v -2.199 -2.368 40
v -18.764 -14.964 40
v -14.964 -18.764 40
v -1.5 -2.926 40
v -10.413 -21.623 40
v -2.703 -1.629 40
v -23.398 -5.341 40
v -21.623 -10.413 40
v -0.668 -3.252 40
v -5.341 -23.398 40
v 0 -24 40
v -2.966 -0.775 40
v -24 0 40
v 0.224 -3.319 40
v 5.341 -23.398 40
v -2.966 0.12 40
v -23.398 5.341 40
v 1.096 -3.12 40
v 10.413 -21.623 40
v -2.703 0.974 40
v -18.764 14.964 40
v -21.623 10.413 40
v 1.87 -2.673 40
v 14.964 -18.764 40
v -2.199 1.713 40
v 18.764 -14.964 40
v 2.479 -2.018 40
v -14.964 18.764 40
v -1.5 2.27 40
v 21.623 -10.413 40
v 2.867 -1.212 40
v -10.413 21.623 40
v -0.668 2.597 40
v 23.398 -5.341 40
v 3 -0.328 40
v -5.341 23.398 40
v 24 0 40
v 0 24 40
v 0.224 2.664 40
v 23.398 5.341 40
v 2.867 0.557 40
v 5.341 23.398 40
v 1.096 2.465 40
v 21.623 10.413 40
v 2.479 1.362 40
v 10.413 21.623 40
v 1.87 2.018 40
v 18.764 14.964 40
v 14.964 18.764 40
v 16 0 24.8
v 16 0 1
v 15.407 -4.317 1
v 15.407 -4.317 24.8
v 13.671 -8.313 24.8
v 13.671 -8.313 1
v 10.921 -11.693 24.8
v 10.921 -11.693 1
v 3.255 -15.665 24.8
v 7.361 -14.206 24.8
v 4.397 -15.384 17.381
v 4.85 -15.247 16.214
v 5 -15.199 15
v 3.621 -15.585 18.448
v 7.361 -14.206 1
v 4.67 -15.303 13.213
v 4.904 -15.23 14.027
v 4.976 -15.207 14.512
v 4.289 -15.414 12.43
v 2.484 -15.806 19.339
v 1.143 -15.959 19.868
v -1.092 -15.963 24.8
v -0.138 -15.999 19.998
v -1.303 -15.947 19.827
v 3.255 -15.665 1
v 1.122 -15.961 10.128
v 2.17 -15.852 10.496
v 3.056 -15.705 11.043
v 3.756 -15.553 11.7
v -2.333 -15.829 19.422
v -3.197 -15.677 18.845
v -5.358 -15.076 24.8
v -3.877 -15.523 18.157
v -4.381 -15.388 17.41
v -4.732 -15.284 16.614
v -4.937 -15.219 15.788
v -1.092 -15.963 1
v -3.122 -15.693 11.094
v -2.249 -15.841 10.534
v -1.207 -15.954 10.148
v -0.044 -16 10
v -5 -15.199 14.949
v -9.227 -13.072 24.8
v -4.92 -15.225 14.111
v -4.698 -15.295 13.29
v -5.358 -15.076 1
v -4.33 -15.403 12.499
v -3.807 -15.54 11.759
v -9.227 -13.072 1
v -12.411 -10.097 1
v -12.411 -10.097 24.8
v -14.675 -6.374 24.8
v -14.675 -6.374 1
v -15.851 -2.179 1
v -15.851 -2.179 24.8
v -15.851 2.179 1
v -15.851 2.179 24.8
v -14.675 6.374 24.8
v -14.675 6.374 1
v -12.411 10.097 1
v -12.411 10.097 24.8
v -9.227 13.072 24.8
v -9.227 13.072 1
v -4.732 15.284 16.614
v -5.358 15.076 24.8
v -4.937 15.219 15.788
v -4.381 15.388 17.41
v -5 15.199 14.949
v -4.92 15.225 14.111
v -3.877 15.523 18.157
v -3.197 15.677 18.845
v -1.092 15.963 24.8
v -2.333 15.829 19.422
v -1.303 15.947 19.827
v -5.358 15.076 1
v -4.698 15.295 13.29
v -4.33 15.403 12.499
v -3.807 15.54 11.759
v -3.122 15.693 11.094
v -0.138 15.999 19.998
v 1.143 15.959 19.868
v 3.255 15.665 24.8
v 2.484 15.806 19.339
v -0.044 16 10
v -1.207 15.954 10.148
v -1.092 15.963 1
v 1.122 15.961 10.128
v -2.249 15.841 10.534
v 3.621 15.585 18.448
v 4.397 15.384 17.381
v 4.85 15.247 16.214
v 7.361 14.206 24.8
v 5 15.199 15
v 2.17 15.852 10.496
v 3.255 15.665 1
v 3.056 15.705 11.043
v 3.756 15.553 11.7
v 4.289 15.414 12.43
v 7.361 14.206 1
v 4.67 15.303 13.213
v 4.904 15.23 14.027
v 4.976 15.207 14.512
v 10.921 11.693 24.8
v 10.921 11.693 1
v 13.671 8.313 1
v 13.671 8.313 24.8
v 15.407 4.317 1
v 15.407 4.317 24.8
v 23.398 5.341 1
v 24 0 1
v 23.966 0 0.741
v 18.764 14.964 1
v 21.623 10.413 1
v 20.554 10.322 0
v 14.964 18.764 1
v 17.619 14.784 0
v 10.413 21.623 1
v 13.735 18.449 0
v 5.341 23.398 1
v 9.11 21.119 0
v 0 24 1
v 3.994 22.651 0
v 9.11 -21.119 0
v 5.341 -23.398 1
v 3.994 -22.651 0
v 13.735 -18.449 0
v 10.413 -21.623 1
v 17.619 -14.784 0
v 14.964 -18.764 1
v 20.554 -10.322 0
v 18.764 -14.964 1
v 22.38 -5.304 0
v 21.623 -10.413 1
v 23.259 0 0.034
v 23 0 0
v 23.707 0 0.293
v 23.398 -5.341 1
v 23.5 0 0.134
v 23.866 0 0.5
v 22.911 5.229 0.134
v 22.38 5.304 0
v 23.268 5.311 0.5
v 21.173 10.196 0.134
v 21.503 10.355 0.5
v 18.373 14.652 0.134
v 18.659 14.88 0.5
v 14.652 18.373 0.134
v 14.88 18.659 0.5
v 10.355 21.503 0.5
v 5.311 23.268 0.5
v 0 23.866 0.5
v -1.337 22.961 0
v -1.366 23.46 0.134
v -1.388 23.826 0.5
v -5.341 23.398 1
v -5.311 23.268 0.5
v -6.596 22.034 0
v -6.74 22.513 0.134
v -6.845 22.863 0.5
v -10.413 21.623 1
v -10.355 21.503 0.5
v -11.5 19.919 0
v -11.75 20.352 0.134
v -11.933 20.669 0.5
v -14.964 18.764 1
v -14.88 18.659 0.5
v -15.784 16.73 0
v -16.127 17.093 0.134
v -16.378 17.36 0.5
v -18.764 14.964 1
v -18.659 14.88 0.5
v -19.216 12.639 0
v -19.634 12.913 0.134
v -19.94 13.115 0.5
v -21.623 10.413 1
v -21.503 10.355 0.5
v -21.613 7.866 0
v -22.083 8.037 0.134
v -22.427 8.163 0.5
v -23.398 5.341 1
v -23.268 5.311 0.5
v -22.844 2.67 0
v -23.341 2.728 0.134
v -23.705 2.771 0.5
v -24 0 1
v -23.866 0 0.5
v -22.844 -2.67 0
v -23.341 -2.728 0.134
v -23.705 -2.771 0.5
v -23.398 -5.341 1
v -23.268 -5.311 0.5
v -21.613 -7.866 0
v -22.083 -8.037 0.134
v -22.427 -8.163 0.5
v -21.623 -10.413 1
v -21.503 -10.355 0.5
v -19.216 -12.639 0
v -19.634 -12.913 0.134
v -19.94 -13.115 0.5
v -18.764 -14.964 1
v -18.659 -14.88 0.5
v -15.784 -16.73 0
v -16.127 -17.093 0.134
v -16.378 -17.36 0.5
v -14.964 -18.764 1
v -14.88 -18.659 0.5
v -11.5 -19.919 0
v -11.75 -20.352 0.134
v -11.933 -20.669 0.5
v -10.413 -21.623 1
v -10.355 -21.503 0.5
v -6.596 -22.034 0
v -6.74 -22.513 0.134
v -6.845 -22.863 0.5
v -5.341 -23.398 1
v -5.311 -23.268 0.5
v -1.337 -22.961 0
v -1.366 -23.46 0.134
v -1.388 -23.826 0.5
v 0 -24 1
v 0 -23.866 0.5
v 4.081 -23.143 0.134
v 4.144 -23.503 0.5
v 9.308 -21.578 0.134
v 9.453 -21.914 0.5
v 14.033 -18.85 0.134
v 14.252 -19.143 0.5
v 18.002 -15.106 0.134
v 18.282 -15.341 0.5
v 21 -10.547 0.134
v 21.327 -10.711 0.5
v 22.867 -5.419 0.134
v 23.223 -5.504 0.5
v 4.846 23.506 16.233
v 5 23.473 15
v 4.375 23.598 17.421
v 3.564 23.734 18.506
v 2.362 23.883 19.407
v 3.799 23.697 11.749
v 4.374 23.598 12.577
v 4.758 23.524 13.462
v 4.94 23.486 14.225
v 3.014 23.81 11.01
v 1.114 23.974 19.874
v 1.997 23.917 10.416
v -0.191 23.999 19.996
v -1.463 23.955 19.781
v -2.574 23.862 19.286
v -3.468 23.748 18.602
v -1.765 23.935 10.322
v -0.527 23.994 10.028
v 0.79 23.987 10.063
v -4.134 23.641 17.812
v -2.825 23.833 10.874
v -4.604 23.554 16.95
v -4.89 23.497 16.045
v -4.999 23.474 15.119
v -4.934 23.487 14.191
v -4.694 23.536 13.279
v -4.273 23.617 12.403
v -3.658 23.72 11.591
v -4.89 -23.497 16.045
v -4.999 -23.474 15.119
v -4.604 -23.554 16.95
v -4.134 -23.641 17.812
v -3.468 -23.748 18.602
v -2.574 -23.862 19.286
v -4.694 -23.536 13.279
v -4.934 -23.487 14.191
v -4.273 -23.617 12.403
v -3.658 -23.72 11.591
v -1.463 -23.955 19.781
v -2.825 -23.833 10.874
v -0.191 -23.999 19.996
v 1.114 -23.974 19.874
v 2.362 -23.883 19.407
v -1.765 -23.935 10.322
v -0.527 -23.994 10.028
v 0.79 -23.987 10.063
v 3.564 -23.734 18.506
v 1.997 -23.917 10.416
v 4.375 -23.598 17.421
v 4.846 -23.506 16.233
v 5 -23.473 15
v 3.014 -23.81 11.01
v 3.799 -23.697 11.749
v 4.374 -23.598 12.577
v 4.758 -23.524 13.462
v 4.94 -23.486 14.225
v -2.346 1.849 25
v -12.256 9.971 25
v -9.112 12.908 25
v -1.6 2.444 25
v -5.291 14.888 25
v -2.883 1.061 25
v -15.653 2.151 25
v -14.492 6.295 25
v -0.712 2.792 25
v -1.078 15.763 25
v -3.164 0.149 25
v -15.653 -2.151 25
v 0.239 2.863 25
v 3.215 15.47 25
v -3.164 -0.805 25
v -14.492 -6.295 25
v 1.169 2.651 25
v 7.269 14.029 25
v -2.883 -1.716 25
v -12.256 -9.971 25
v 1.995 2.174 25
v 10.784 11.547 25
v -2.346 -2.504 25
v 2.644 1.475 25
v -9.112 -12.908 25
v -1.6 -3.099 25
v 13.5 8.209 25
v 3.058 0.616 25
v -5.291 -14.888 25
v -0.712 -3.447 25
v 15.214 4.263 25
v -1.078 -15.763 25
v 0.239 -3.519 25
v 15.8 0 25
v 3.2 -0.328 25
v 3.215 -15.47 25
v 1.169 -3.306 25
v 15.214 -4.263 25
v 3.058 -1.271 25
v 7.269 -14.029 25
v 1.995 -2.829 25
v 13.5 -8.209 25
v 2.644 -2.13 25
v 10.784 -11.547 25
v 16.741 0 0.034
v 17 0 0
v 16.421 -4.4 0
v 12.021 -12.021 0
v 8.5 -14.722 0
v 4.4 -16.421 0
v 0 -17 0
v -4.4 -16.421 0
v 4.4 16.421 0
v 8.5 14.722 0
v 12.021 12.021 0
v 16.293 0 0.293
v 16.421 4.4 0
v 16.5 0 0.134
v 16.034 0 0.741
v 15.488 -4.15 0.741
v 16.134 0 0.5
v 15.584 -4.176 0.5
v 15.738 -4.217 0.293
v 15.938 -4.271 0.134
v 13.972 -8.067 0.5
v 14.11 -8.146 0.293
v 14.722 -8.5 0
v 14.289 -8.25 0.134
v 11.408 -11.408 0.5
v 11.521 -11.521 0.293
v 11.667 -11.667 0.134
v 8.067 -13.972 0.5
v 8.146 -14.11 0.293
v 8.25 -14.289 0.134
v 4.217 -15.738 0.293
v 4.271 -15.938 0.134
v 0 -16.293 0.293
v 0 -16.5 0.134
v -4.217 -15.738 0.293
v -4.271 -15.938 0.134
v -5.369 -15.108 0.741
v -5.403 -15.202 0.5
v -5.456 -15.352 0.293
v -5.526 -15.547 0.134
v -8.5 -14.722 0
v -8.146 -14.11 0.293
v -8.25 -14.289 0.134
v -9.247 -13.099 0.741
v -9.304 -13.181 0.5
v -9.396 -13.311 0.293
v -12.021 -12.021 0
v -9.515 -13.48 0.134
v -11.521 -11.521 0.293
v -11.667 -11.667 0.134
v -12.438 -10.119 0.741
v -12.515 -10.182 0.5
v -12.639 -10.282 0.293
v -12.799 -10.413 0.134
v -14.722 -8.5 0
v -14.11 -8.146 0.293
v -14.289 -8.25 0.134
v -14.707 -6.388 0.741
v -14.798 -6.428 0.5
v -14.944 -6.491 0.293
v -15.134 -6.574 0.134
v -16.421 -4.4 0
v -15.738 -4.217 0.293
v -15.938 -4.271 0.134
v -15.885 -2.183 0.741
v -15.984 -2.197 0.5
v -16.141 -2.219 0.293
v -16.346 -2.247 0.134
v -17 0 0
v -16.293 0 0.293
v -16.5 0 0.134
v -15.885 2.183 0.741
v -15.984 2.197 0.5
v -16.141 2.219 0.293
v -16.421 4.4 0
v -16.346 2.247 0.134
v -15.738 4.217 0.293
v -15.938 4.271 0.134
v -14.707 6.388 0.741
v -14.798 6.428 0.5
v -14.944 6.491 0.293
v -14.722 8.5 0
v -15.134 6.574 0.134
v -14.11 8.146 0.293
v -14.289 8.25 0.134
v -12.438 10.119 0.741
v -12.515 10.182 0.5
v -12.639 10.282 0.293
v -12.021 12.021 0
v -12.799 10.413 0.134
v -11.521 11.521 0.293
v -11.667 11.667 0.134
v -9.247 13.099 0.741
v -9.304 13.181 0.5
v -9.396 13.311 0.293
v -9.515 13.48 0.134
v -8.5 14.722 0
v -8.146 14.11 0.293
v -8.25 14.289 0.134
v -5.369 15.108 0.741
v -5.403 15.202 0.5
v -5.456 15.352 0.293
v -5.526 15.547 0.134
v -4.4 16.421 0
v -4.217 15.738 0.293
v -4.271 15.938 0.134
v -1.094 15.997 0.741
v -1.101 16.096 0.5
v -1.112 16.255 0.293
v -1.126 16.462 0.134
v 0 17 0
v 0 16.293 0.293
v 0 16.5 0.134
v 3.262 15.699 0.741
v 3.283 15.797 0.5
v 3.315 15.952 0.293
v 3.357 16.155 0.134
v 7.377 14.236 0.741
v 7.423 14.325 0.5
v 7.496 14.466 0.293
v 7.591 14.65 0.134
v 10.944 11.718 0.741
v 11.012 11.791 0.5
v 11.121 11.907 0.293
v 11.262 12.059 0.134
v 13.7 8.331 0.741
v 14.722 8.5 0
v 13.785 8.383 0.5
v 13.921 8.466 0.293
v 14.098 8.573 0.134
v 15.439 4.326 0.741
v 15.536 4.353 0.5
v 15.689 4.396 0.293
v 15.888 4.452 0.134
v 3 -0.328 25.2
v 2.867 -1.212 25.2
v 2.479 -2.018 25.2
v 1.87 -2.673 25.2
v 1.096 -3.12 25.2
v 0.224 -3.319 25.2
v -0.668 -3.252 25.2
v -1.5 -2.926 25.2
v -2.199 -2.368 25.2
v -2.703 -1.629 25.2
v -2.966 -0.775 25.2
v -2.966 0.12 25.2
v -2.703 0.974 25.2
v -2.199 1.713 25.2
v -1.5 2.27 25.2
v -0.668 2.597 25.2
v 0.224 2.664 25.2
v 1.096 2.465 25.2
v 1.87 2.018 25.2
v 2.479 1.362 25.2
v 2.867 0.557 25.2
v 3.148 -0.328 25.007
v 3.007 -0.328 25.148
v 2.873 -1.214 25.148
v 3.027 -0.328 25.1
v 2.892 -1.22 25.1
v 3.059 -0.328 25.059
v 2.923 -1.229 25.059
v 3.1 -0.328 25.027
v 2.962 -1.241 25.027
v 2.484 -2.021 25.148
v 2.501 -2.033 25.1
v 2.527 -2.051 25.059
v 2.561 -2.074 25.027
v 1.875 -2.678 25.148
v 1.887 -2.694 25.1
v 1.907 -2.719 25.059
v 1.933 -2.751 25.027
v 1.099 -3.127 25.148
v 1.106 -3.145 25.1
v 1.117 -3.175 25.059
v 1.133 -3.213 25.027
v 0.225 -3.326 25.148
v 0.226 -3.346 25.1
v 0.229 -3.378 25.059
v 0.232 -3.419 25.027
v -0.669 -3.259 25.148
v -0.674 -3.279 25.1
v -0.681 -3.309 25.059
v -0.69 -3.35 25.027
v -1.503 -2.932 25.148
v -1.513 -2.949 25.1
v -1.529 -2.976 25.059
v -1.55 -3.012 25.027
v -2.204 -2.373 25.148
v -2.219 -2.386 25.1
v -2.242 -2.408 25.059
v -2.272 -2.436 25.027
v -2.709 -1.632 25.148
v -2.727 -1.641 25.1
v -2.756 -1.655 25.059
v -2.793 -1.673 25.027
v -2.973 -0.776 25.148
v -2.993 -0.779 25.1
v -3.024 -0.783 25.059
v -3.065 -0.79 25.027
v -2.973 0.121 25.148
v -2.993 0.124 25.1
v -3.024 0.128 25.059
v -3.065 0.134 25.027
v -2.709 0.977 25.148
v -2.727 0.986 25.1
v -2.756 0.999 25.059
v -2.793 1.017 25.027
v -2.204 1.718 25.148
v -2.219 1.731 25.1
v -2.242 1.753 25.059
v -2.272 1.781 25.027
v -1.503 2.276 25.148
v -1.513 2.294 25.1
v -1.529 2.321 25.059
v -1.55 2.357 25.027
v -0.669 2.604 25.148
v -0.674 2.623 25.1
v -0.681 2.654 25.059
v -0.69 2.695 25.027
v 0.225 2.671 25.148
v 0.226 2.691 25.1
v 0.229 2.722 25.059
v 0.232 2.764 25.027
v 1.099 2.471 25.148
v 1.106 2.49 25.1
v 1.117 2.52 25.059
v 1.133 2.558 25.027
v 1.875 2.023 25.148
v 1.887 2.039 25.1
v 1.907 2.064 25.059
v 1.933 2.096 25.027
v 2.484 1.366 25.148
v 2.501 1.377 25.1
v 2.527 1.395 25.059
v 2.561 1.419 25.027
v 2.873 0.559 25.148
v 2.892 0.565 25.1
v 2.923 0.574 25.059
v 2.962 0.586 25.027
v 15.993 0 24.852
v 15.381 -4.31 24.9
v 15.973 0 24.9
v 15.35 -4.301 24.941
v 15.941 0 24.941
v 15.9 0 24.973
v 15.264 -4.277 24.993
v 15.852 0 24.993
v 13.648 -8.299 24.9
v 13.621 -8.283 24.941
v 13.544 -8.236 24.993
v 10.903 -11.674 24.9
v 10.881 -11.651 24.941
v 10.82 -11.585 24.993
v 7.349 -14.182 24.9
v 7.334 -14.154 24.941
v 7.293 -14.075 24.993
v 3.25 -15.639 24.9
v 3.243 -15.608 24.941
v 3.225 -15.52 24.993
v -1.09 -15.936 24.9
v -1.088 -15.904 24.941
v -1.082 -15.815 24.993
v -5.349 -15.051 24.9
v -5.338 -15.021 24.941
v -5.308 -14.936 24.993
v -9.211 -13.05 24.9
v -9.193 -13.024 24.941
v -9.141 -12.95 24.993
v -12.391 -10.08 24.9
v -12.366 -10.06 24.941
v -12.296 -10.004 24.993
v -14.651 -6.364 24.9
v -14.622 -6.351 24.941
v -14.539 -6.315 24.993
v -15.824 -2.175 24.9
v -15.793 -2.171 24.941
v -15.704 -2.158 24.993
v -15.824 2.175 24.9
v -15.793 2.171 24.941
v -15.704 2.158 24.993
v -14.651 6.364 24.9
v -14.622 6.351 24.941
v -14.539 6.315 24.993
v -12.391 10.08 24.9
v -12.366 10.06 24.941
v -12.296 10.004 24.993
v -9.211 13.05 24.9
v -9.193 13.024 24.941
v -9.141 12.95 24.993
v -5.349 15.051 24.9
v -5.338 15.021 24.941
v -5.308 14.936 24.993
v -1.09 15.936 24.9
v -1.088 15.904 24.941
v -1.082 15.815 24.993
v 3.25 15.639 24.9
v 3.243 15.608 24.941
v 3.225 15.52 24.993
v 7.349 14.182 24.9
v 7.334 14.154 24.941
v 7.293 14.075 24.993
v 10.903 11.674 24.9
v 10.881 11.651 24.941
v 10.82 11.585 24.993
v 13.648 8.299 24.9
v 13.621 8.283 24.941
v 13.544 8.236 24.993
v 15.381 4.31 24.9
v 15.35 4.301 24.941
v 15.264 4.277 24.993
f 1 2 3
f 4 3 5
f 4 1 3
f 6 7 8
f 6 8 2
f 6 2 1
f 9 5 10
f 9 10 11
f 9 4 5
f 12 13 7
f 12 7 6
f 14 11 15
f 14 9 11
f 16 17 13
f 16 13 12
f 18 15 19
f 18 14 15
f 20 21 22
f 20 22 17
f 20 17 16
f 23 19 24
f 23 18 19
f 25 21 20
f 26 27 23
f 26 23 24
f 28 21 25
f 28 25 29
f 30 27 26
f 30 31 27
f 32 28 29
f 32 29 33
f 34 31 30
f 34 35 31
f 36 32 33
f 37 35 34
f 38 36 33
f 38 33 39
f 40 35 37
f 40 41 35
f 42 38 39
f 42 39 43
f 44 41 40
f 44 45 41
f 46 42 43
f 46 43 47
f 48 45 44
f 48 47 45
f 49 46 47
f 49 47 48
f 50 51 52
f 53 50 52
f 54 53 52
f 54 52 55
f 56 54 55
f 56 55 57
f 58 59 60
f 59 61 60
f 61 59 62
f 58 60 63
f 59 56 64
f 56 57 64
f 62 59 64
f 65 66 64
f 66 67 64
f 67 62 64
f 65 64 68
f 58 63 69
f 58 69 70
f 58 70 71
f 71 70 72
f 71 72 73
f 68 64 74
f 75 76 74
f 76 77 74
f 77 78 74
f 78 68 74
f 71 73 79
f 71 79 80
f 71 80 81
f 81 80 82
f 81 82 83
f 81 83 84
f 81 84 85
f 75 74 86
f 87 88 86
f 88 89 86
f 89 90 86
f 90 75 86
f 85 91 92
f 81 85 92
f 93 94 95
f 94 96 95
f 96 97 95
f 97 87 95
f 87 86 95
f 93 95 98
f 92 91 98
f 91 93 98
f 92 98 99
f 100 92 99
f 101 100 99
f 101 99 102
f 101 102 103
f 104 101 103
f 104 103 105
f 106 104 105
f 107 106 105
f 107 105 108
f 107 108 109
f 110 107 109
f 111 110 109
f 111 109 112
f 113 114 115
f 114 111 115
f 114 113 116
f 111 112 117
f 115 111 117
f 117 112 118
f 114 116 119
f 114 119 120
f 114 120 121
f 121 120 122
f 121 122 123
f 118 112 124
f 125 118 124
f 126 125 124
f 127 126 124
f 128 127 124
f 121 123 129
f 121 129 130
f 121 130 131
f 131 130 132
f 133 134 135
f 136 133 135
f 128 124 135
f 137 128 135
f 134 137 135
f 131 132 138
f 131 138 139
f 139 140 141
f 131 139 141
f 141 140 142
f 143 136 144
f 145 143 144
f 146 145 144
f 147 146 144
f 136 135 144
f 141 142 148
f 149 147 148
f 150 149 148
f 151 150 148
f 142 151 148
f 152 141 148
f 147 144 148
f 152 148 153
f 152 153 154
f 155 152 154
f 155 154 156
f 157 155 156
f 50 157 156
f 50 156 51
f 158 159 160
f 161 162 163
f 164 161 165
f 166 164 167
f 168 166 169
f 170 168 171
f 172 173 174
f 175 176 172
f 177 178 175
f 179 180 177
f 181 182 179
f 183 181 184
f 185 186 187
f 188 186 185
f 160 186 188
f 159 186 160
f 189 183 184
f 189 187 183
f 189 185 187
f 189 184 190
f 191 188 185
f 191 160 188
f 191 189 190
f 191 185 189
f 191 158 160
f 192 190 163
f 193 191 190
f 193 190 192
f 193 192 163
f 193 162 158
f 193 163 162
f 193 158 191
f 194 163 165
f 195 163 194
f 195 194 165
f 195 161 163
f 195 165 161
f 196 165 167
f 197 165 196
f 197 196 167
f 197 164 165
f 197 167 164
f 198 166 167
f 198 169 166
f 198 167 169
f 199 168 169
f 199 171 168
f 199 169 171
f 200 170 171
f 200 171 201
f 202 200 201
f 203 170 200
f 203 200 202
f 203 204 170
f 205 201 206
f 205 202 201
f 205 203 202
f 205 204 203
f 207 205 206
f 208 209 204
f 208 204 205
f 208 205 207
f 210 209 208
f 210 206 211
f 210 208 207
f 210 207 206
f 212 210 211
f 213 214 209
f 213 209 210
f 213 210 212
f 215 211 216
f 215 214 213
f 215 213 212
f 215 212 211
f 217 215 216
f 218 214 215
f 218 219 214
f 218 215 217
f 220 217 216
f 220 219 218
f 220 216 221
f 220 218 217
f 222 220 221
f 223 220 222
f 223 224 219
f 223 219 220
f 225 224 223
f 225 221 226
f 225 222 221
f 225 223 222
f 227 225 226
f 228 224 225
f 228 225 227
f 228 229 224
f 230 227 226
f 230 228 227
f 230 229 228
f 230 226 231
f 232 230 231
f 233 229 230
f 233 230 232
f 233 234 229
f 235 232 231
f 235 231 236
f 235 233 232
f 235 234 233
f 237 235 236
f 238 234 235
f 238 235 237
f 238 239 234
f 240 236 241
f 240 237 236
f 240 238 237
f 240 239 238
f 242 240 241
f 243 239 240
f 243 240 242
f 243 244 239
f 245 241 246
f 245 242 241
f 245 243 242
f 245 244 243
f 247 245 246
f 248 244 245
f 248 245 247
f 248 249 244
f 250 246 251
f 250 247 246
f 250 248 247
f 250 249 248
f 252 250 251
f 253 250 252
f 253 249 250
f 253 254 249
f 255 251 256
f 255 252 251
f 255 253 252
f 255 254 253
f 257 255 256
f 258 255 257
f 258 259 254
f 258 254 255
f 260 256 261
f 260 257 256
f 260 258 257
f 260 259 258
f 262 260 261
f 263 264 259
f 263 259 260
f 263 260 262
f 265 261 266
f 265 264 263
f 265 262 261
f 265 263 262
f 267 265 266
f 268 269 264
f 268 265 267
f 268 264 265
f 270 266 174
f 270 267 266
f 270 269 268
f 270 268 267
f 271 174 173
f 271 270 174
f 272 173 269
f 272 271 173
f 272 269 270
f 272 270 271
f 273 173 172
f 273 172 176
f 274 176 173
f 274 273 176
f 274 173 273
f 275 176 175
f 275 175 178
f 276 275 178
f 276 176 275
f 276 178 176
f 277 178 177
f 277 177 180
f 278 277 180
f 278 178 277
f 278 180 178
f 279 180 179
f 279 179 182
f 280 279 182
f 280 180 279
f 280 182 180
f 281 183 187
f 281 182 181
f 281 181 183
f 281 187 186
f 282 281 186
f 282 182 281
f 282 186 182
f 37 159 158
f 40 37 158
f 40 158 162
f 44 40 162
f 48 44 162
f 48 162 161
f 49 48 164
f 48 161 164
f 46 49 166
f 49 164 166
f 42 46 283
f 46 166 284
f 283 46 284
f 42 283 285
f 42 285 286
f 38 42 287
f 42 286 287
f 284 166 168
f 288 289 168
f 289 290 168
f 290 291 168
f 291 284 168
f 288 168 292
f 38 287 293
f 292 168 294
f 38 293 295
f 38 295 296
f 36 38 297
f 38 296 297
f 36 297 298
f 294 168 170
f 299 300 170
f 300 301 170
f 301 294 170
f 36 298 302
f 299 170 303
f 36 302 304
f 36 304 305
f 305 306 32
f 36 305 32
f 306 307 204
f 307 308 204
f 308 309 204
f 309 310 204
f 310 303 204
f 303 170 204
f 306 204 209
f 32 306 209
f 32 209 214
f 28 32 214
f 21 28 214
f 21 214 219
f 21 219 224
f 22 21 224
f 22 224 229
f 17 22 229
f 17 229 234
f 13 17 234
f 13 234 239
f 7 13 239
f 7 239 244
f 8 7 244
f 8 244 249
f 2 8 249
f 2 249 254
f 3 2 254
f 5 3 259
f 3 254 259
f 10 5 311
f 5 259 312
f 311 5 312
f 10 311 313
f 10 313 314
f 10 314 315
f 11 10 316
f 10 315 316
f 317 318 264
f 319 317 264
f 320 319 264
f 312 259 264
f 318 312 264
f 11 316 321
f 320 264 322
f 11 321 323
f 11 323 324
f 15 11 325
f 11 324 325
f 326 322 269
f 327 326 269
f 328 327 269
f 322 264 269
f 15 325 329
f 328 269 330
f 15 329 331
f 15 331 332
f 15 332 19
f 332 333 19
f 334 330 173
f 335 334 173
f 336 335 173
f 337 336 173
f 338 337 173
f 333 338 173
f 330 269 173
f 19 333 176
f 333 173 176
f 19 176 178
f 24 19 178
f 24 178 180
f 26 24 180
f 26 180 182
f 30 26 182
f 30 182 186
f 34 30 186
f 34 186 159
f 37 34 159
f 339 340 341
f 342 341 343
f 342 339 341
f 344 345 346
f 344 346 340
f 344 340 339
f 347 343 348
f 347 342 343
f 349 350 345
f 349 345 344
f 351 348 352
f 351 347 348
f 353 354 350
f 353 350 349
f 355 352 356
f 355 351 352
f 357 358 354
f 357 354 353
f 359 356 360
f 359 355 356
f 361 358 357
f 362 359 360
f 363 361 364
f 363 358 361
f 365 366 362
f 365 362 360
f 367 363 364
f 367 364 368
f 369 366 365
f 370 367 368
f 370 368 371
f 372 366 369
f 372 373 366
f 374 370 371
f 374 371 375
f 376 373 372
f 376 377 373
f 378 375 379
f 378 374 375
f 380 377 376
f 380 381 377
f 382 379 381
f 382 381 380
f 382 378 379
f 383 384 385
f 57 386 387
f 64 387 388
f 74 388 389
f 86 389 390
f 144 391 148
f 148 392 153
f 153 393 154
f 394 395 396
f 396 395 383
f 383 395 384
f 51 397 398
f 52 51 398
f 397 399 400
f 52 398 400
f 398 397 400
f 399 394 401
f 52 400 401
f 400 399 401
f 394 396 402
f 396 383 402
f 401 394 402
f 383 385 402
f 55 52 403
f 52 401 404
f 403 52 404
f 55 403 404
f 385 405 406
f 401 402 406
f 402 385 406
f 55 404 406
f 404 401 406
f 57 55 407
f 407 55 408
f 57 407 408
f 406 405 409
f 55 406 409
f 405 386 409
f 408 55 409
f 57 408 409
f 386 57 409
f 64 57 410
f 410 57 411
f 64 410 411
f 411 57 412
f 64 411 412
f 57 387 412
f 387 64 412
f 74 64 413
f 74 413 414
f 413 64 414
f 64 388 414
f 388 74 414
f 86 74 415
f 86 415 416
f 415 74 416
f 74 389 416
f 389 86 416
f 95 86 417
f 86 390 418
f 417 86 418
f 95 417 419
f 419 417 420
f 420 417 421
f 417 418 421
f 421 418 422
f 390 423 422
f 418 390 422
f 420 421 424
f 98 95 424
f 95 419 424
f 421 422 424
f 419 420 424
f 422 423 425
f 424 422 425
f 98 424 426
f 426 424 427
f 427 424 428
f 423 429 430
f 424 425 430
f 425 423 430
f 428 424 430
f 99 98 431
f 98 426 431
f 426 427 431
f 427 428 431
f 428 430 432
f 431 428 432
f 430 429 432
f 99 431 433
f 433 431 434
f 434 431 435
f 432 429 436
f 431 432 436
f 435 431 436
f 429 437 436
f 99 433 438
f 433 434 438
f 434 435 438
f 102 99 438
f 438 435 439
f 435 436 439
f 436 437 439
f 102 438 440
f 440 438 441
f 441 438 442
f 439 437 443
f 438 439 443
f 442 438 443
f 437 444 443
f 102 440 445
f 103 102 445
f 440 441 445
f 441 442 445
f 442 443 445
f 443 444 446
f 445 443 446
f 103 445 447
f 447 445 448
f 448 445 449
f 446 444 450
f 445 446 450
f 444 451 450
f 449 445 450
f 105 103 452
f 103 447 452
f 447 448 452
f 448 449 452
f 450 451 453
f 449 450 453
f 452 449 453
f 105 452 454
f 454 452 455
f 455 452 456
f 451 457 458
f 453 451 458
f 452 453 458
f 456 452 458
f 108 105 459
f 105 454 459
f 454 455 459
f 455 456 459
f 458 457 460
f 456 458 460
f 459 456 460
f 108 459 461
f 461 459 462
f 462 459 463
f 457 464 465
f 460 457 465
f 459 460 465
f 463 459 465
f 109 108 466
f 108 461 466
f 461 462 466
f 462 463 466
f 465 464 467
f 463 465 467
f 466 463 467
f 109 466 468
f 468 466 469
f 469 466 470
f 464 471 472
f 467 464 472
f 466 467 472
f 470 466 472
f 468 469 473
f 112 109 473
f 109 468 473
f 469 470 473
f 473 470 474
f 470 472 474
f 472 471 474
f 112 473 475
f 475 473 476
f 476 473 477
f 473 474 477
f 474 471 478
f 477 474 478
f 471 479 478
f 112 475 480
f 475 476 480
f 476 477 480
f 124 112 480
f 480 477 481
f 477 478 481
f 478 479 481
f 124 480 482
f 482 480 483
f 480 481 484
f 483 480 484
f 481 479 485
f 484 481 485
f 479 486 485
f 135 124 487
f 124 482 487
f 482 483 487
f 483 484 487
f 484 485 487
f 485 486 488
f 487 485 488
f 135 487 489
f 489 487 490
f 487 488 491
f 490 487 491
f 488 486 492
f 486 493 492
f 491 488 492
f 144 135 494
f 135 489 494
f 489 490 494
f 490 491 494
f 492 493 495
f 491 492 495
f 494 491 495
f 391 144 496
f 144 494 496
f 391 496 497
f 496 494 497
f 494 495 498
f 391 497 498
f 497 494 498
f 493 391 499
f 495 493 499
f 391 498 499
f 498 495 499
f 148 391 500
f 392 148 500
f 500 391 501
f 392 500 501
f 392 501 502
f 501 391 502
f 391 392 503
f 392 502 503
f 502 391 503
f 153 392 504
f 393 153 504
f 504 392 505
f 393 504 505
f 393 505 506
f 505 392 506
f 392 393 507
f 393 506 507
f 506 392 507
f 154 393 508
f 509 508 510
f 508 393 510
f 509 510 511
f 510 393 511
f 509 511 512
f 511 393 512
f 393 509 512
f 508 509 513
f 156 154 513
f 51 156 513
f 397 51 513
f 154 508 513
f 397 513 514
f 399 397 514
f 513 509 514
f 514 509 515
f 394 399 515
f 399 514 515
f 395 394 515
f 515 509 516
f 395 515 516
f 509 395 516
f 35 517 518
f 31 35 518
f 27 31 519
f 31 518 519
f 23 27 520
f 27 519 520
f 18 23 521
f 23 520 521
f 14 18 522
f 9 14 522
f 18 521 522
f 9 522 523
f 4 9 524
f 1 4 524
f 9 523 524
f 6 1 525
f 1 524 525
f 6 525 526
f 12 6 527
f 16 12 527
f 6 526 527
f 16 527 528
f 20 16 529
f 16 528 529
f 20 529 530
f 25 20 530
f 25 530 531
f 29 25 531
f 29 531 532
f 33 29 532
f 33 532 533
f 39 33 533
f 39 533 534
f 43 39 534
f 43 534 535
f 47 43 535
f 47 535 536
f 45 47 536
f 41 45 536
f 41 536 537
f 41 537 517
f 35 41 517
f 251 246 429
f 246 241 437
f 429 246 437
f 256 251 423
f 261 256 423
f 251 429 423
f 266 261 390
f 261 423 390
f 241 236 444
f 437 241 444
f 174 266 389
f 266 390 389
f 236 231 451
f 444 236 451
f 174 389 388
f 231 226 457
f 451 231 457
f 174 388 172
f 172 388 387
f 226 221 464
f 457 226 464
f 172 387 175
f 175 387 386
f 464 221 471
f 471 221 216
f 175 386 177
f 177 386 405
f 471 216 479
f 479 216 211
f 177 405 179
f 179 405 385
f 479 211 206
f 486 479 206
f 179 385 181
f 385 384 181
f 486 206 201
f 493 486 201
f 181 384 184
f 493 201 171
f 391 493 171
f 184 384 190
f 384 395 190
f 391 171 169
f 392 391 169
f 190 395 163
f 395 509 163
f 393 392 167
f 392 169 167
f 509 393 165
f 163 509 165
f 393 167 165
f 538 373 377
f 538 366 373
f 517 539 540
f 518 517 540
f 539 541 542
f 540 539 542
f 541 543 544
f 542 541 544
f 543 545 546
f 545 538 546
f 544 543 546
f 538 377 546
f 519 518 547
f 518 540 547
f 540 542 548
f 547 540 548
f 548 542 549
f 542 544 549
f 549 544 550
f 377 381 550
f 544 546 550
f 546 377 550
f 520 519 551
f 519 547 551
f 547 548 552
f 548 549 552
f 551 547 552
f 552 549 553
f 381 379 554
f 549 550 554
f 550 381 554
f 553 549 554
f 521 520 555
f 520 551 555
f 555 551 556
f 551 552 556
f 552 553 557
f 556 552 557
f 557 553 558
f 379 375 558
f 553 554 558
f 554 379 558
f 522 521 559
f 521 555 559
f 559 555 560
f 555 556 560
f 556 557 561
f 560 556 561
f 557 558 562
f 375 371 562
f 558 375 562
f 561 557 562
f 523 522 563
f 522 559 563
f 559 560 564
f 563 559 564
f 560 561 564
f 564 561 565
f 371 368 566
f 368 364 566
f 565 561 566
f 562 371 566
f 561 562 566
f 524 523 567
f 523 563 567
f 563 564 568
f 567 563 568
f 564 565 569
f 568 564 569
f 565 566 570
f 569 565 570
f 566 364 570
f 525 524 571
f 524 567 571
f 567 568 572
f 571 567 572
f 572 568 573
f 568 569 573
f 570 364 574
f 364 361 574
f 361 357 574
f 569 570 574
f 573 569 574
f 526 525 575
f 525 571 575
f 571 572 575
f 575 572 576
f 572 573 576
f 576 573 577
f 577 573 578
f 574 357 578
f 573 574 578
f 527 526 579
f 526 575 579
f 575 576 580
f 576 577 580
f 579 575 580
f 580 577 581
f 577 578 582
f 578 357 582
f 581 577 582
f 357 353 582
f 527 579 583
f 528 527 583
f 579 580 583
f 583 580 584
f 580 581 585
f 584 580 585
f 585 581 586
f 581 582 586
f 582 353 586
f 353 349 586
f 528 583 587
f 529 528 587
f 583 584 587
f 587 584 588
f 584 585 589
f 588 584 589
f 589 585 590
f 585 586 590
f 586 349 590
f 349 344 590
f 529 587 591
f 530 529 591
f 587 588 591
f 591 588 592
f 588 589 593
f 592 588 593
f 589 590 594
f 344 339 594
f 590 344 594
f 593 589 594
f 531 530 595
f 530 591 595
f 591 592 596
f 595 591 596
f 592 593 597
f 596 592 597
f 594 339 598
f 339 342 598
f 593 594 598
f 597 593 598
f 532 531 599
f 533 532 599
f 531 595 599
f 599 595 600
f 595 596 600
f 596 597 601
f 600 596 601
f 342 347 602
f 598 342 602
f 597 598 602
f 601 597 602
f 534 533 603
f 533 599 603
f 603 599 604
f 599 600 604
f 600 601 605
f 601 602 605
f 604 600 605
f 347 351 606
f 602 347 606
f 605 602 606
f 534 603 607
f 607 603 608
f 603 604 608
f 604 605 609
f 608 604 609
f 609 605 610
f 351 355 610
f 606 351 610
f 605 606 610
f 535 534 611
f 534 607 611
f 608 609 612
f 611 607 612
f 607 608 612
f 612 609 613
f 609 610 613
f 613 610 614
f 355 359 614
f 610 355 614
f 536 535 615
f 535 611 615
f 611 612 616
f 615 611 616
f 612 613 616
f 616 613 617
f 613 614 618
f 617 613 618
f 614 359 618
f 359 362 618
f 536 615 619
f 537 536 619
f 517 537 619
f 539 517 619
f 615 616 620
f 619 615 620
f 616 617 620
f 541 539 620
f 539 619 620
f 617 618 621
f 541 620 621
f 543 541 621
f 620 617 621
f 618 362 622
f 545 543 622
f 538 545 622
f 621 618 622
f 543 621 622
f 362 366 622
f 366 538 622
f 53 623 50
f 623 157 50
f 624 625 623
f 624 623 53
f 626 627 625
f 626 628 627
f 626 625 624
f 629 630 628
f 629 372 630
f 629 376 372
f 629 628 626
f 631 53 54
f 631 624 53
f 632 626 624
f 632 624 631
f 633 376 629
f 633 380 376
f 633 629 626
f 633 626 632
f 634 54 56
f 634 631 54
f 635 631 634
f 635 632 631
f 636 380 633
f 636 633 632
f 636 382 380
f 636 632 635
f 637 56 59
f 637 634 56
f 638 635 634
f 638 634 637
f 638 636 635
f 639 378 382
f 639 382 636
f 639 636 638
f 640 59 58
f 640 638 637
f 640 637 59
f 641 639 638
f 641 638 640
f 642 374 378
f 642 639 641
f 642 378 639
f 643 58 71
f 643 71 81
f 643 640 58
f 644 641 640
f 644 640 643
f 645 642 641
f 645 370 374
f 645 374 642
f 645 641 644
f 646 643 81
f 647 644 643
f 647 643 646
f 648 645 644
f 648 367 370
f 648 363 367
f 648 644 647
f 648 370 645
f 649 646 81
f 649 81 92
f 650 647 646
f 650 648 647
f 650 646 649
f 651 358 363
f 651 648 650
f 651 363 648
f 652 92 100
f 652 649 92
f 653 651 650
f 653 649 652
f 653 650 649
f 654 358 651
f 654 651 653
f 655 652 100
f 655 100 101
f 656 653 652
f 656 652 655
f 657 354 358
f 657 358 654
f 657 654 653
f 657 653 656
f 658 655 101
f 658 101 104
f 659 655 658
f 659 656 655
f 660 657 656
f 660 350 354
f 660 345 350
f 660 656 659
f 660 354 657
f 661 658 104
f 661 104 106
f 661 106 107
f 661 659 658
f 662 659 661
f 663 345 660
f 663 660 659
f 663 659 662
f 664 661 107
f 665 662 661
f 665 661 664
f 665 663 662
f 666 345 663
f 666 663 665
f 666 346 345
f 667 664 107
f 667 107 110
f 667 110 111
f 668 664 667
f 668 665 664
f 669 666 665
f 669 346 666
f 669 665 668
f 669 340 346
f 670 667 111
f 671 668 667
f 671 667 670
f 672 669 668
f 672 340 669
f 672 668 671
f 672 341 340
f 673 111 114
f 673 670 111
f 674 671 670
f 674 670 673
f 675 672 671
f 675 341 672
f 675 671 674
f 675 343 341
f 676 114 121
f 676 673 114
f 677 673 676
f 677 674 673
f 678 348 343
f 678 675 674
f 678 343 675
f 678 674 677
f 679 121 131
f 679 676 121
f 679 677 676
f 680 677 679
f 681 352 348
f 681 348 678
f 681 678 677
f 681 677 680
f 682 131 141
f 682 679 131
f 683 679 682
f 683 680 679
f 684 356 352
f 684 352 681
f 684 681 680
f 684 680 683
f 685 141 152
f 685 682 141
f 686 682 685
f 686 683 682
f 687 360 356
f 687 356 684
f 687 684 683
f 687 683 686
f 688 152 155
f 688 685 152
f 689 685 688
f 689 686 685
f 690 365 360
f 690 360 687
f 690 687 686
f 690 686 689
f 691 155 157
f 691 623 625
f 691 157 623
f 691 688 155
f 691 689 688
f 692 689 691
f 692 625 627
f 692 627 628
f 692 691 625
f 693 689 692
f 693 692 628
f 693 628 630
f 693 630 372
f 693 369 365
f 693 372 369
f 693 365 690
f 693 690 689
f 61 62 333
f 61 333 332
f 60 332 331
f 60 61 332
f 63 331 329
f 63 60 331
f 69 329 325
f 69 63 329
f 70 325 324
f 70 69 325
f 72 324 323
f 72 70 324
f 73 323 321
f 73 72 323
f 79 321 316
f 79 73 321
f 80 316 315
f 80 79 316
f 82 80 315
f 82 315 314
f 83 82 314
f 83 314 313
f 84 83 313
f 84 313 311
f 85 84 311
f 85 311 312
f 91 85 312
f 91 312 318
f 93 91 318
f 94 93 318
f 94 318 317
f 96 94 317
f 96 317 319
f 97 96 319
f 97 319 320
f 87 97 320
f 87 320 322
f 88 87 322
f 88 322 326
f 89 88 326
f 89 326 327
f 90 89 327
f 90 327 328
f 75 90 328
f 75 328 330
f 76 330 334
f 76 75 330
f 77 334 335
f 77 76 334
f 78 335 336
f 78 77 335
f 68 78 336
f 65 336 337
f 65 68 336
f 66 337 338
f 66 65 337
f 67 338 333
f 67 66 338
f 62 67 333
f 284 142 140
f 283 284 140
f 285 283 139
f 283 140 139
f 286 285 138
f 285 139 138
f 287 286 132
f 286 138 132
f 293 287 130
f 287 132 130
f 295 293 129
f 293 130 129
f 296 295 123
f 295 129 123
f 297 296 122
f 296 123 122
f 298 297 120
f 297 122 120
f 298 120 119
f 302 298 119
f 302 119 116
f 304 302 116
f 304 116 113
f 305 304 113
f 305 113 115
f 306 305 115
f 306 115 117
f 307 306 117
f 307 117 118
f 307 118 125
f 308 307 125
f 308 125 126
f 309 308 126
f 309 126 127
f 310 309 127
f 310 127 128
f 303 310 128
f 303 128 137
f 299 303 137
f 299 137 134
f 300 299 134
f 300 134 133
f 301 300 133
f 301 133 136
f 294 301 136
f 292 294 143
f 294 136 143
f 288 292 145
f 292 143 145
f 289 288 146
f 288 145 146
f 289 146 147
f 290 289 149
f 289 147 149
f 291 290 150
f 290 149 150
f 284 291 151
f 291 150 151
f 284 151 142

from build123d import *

# Parameters (mm, degrees)
F0_R      = 24
F1_DEPTH  = 40
F2_R      = 16
F3_DEPTH  = 25
F4_R      = 3
F5_DEPTH  = 25
F6_R      = 0.2
F7_R      = 1
F8_R      = 5
F9_DEPTH  = 50
F10_R     = 5
F11_DEPTH = 25


with BuildPart() as f1:
    # F0 (on Top) → F1 (new body)
    with BuildSketch(Plane.XY):
        Circle(F0_R)
    extrude(amount=F1_DEPTH)

    # F2 (on face) → F3 (cut)
    with BuildSketch(Plane(origin=(0, 0, 0), x_dir=(1, 0, 0), z_dir=(0, 0, -1))):
        Circle(F2_R)
    extrude(amount=-F3_DEPTH, mode=Mode.SUBTRACT)

    # F4 (on face) → F5 (cut)
    with BuildSketch(Plane(origin=(0, 0, 25), x_dir=(1, 0, 0), z_dir=(0, 0, -1))):
        with Locations((0, 0.3276021098)):
            Circle(F4_R)
    extrude(amount=-F5_DEPTH, mode=Mode.SUBTRACT)

    # F6
    f6_edges = [f1.edges().sort_by_distance(p)[0] for p in [
        (-3, -0.327602, 25),
        (-16, 0, 25),
    ]]
    fillet(f6_edges, radius=F6_R)

    # F7
    f7_edges = [f1.edges().sort_by_distance(p)[0] for p in [
        (-16, 0, 0),
        (-24, 0, 0),
    ]]
    fillet(f7_edges, radius=F7_R)

    # F8 (on Front) → F9 (cut)
    with BuildSketch(Plane.XZ):
        with Locations((0, 15)):
            Circle(F8_R)
    extrude(amount=F9_DEPTH, mode=Mode.SUBTRACT)

    # F10 (on Front) → F11 (cut)
    with BuildSketch(Plane.XZ):
        with Locations((0, 15)):
            Circle(F10_R)
    extrude(amount=-F11_DEPTH, mode=Mode.SUBTRACT)


solid = f1.part
